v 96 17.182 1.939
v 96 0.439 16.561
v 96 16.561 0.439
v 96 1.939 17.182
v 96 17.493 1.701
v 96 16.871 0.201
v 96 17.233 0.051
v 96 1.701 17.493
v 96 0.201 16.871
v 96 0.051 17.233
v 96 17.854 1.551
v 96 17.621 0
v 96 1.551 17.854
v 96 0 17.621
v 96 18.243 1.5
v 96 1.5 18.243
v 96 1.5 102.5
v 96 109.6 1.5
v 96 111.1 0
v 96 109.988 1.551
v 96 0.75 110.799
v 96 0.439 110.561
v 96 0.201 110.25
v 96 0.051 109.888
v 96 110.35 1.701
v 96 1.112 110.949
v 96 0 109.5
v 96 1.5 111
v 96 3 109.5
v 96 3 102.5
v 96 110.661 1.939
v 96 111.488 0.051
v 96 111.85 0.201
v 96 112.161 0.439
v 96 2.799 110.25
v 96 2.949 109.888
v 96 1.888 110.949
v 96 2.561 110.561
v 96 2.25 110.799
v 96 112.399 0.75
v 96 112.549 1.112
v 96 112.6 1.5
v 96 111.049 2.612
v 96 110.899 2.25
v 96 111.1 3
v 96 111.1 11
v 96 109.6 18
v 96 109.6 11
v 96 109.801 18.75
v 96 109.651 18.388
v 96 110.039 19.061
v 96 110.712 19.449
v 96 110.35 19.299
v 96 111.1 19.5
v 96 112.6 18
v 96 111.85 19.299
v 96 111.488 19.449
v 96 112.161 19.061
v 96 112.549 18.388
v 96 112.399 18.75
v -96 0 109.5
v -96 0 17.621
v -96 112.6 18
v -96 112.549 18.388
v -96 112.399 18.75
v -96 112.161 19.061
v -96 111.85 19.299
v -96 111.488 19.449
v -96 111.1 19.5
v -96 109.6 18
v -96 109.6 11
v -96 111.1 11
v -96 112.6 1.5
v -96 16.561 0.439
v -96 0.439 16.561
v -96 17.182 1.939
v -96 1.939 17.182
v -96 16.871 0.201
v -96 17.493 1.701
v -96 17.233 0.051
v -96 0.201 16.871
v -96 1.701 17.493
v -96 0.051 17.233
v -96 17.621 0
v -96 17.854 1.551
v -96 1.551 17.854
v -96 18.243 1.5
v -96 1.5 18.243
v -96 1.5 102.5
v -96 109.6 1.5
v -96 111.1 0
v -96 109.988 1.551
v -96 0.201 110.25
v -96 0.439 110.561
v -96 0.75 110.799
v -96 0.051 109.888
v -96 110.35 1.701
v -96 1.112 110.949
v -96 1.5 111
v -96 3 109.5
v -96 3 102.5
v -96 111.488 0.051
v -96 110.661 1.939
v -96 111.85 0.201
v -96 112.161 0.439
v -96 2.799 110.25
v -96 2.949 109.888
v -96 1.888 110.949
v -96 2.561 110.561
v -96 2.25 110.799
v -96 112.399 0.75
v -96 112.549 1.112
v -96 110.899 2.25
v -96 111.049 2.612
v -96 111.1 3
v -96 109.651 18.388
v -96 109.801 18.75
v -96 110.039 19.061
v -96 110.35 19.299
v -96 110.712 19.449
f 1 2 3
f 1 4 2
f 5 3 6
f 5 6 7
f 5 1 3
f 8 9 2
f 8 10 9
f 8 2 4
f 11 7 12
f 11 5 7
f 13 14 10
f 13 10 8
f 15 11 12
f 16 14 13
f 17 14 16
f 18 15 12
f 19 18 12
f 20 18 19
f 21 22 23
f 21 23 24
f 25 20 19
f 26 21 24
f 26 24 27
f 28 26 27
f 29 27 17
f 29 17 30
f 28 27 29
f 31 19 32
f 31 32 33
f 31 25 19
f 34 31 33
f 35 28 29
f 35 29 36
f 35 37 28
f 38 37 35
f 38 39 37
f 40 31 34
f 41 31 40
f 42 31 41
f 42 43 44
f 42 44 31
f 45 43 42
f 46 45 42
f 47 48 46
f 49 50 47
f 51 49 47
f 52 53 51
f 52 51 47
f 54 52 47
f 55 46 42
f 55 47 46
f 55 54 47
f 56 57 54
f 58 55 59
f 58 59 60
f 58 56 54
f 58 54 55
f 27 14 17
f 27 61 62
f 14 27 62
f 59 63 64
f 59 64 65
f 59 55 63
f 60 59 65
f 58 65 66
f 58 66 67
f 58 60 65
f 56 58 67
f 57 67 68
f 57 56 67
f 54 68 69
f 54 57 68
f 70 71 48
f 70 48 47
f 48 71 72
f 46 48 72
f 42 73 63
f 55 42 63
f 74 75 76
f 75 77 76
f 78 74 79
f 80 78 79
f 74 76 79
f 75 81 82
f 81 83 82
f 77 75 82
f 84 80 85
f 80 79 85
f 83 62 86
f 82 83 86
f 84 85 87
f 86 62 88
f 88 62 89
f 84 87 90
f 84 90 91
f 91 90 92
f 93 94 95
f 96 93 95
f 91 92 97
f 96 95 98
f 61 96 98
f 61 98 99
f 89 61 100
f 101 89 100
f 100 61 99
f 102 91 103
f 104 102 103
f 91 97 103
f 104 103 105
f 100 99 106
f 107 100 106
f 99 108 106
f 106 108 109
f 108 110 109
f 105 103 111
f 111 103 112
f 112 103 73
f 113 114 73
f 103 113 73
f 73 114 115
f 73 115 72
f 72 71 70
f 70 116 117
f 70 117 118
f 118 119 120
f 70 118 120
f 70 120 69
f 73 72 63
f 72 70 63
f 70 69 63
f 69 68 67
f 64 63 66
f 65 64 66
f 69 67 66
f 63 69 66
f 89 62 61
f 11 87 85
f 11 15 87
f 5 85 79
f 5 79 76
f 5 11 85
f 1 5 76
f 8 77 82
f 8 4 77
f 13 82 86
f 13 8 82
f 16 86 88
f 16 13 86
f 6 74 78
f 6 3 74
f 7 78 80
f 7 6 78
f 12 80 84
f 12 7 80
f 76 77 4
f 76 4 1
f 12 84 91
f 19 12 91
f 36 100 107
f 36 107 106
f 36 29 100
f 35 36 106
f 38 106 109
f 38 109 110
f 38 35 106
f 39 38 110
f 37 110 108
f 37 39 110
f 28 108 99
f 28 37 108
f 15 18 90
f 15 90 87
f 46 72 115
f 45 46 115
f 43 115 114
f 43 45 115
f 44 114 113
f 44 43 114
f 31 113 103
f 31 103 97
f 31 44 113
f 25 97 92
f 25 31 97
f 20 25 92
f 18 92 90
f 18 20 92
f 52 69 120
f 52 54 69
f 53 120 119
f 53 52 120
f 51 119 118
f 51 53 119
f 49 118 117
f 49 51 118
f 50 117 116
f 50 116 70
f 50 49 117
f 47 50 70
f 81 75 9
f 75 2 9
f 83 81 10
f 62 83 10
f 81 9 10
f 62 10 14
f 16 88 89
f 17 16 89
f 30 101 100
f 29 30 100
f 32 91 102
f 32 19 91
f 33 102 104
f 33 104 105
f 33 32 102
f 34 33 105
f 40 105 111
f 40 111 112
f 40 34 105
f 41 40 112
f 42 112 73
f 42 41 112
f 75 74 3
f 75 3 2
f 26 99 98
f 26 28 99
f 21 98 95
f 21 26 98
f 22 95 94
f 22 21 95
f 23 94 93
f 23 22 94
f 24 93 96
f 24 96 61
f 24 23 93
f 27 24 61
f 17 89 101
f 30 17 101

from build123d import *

# Parameters (mm, degrees)
EXTRUDE_1_DEPTH      = 96
EXTRUDE_1_DEPTH_BACK = 96
SKETCH_1_W           = 1.5
SKETCH_1_H           = 8.5
FILLET_1_R           = 1.5


with BuildPart() as part:
    # 草圖1 → 擠出1 (new, two sides: drawn at the far end of the back side and taken through both)
    with BuildSketch(Plane.YZ.offset(-EXTRUDE_1_DEPTH_BACK)):
        Polygon((1.5, 17), (1.5, 17.621320344), (0, 17), align=None)
        Polygon((17.621320344, 1.5), (17, 1.5), (17, 0), align=None)
        with Locations((2.25, 106.75)):
            Rectangle(SKETCH_1_W, SKETCH_1_H)
        with Locations((110.35, 15.25)):
            Rectangle(SKETCH_1_W, SKETCH_1_H)
        Polygon((111.1, 11), (111.1, 1.5), (112.6, 1.5), (112.6, 19.5), (111.1, 19.5), align=None)
        Polygon((17.621320344, 1.5), (17, 1.5), (17, 0), (0, 17), (1.5, 17), (1.5, 17.621320344), align=None)
        Polygon((0, 111), (0, 17), (1.5, 17.621320344), (1.5, 102.5), (1.5, 111), align=None)
        Polygon((17.621320344, 1.5), (17, 0), (112.6, 0), (112.6, 1.5), (111.1, 1.5), align=None)
    extrude(amount=EXTRUDE_1_DEPTH + EXTRUDE_1_DEPTH_BACK)

    # 圓角1
    fillet_1_edges = [part.edges().sort_by_distance(p)[0] for p in [
        (0, 0, 111),
        (0, 3, 111),
        (0, 1.5, 17.621320344),
        (0, 17, 0),
        (0, 0, 17),
        (0, 17.621320344, 1.5),
        (0, 111.1, 1.5),
        (0, 112.6, 0),
        (0, 109.6, 19.5),
        (0, 112.6, 19.5),
    ]]
    fillet(fillet_1_edges, radius=FILLET_1_R - 0.0001)  # a hair under: the kernel refuses the full size


solid = part.part
